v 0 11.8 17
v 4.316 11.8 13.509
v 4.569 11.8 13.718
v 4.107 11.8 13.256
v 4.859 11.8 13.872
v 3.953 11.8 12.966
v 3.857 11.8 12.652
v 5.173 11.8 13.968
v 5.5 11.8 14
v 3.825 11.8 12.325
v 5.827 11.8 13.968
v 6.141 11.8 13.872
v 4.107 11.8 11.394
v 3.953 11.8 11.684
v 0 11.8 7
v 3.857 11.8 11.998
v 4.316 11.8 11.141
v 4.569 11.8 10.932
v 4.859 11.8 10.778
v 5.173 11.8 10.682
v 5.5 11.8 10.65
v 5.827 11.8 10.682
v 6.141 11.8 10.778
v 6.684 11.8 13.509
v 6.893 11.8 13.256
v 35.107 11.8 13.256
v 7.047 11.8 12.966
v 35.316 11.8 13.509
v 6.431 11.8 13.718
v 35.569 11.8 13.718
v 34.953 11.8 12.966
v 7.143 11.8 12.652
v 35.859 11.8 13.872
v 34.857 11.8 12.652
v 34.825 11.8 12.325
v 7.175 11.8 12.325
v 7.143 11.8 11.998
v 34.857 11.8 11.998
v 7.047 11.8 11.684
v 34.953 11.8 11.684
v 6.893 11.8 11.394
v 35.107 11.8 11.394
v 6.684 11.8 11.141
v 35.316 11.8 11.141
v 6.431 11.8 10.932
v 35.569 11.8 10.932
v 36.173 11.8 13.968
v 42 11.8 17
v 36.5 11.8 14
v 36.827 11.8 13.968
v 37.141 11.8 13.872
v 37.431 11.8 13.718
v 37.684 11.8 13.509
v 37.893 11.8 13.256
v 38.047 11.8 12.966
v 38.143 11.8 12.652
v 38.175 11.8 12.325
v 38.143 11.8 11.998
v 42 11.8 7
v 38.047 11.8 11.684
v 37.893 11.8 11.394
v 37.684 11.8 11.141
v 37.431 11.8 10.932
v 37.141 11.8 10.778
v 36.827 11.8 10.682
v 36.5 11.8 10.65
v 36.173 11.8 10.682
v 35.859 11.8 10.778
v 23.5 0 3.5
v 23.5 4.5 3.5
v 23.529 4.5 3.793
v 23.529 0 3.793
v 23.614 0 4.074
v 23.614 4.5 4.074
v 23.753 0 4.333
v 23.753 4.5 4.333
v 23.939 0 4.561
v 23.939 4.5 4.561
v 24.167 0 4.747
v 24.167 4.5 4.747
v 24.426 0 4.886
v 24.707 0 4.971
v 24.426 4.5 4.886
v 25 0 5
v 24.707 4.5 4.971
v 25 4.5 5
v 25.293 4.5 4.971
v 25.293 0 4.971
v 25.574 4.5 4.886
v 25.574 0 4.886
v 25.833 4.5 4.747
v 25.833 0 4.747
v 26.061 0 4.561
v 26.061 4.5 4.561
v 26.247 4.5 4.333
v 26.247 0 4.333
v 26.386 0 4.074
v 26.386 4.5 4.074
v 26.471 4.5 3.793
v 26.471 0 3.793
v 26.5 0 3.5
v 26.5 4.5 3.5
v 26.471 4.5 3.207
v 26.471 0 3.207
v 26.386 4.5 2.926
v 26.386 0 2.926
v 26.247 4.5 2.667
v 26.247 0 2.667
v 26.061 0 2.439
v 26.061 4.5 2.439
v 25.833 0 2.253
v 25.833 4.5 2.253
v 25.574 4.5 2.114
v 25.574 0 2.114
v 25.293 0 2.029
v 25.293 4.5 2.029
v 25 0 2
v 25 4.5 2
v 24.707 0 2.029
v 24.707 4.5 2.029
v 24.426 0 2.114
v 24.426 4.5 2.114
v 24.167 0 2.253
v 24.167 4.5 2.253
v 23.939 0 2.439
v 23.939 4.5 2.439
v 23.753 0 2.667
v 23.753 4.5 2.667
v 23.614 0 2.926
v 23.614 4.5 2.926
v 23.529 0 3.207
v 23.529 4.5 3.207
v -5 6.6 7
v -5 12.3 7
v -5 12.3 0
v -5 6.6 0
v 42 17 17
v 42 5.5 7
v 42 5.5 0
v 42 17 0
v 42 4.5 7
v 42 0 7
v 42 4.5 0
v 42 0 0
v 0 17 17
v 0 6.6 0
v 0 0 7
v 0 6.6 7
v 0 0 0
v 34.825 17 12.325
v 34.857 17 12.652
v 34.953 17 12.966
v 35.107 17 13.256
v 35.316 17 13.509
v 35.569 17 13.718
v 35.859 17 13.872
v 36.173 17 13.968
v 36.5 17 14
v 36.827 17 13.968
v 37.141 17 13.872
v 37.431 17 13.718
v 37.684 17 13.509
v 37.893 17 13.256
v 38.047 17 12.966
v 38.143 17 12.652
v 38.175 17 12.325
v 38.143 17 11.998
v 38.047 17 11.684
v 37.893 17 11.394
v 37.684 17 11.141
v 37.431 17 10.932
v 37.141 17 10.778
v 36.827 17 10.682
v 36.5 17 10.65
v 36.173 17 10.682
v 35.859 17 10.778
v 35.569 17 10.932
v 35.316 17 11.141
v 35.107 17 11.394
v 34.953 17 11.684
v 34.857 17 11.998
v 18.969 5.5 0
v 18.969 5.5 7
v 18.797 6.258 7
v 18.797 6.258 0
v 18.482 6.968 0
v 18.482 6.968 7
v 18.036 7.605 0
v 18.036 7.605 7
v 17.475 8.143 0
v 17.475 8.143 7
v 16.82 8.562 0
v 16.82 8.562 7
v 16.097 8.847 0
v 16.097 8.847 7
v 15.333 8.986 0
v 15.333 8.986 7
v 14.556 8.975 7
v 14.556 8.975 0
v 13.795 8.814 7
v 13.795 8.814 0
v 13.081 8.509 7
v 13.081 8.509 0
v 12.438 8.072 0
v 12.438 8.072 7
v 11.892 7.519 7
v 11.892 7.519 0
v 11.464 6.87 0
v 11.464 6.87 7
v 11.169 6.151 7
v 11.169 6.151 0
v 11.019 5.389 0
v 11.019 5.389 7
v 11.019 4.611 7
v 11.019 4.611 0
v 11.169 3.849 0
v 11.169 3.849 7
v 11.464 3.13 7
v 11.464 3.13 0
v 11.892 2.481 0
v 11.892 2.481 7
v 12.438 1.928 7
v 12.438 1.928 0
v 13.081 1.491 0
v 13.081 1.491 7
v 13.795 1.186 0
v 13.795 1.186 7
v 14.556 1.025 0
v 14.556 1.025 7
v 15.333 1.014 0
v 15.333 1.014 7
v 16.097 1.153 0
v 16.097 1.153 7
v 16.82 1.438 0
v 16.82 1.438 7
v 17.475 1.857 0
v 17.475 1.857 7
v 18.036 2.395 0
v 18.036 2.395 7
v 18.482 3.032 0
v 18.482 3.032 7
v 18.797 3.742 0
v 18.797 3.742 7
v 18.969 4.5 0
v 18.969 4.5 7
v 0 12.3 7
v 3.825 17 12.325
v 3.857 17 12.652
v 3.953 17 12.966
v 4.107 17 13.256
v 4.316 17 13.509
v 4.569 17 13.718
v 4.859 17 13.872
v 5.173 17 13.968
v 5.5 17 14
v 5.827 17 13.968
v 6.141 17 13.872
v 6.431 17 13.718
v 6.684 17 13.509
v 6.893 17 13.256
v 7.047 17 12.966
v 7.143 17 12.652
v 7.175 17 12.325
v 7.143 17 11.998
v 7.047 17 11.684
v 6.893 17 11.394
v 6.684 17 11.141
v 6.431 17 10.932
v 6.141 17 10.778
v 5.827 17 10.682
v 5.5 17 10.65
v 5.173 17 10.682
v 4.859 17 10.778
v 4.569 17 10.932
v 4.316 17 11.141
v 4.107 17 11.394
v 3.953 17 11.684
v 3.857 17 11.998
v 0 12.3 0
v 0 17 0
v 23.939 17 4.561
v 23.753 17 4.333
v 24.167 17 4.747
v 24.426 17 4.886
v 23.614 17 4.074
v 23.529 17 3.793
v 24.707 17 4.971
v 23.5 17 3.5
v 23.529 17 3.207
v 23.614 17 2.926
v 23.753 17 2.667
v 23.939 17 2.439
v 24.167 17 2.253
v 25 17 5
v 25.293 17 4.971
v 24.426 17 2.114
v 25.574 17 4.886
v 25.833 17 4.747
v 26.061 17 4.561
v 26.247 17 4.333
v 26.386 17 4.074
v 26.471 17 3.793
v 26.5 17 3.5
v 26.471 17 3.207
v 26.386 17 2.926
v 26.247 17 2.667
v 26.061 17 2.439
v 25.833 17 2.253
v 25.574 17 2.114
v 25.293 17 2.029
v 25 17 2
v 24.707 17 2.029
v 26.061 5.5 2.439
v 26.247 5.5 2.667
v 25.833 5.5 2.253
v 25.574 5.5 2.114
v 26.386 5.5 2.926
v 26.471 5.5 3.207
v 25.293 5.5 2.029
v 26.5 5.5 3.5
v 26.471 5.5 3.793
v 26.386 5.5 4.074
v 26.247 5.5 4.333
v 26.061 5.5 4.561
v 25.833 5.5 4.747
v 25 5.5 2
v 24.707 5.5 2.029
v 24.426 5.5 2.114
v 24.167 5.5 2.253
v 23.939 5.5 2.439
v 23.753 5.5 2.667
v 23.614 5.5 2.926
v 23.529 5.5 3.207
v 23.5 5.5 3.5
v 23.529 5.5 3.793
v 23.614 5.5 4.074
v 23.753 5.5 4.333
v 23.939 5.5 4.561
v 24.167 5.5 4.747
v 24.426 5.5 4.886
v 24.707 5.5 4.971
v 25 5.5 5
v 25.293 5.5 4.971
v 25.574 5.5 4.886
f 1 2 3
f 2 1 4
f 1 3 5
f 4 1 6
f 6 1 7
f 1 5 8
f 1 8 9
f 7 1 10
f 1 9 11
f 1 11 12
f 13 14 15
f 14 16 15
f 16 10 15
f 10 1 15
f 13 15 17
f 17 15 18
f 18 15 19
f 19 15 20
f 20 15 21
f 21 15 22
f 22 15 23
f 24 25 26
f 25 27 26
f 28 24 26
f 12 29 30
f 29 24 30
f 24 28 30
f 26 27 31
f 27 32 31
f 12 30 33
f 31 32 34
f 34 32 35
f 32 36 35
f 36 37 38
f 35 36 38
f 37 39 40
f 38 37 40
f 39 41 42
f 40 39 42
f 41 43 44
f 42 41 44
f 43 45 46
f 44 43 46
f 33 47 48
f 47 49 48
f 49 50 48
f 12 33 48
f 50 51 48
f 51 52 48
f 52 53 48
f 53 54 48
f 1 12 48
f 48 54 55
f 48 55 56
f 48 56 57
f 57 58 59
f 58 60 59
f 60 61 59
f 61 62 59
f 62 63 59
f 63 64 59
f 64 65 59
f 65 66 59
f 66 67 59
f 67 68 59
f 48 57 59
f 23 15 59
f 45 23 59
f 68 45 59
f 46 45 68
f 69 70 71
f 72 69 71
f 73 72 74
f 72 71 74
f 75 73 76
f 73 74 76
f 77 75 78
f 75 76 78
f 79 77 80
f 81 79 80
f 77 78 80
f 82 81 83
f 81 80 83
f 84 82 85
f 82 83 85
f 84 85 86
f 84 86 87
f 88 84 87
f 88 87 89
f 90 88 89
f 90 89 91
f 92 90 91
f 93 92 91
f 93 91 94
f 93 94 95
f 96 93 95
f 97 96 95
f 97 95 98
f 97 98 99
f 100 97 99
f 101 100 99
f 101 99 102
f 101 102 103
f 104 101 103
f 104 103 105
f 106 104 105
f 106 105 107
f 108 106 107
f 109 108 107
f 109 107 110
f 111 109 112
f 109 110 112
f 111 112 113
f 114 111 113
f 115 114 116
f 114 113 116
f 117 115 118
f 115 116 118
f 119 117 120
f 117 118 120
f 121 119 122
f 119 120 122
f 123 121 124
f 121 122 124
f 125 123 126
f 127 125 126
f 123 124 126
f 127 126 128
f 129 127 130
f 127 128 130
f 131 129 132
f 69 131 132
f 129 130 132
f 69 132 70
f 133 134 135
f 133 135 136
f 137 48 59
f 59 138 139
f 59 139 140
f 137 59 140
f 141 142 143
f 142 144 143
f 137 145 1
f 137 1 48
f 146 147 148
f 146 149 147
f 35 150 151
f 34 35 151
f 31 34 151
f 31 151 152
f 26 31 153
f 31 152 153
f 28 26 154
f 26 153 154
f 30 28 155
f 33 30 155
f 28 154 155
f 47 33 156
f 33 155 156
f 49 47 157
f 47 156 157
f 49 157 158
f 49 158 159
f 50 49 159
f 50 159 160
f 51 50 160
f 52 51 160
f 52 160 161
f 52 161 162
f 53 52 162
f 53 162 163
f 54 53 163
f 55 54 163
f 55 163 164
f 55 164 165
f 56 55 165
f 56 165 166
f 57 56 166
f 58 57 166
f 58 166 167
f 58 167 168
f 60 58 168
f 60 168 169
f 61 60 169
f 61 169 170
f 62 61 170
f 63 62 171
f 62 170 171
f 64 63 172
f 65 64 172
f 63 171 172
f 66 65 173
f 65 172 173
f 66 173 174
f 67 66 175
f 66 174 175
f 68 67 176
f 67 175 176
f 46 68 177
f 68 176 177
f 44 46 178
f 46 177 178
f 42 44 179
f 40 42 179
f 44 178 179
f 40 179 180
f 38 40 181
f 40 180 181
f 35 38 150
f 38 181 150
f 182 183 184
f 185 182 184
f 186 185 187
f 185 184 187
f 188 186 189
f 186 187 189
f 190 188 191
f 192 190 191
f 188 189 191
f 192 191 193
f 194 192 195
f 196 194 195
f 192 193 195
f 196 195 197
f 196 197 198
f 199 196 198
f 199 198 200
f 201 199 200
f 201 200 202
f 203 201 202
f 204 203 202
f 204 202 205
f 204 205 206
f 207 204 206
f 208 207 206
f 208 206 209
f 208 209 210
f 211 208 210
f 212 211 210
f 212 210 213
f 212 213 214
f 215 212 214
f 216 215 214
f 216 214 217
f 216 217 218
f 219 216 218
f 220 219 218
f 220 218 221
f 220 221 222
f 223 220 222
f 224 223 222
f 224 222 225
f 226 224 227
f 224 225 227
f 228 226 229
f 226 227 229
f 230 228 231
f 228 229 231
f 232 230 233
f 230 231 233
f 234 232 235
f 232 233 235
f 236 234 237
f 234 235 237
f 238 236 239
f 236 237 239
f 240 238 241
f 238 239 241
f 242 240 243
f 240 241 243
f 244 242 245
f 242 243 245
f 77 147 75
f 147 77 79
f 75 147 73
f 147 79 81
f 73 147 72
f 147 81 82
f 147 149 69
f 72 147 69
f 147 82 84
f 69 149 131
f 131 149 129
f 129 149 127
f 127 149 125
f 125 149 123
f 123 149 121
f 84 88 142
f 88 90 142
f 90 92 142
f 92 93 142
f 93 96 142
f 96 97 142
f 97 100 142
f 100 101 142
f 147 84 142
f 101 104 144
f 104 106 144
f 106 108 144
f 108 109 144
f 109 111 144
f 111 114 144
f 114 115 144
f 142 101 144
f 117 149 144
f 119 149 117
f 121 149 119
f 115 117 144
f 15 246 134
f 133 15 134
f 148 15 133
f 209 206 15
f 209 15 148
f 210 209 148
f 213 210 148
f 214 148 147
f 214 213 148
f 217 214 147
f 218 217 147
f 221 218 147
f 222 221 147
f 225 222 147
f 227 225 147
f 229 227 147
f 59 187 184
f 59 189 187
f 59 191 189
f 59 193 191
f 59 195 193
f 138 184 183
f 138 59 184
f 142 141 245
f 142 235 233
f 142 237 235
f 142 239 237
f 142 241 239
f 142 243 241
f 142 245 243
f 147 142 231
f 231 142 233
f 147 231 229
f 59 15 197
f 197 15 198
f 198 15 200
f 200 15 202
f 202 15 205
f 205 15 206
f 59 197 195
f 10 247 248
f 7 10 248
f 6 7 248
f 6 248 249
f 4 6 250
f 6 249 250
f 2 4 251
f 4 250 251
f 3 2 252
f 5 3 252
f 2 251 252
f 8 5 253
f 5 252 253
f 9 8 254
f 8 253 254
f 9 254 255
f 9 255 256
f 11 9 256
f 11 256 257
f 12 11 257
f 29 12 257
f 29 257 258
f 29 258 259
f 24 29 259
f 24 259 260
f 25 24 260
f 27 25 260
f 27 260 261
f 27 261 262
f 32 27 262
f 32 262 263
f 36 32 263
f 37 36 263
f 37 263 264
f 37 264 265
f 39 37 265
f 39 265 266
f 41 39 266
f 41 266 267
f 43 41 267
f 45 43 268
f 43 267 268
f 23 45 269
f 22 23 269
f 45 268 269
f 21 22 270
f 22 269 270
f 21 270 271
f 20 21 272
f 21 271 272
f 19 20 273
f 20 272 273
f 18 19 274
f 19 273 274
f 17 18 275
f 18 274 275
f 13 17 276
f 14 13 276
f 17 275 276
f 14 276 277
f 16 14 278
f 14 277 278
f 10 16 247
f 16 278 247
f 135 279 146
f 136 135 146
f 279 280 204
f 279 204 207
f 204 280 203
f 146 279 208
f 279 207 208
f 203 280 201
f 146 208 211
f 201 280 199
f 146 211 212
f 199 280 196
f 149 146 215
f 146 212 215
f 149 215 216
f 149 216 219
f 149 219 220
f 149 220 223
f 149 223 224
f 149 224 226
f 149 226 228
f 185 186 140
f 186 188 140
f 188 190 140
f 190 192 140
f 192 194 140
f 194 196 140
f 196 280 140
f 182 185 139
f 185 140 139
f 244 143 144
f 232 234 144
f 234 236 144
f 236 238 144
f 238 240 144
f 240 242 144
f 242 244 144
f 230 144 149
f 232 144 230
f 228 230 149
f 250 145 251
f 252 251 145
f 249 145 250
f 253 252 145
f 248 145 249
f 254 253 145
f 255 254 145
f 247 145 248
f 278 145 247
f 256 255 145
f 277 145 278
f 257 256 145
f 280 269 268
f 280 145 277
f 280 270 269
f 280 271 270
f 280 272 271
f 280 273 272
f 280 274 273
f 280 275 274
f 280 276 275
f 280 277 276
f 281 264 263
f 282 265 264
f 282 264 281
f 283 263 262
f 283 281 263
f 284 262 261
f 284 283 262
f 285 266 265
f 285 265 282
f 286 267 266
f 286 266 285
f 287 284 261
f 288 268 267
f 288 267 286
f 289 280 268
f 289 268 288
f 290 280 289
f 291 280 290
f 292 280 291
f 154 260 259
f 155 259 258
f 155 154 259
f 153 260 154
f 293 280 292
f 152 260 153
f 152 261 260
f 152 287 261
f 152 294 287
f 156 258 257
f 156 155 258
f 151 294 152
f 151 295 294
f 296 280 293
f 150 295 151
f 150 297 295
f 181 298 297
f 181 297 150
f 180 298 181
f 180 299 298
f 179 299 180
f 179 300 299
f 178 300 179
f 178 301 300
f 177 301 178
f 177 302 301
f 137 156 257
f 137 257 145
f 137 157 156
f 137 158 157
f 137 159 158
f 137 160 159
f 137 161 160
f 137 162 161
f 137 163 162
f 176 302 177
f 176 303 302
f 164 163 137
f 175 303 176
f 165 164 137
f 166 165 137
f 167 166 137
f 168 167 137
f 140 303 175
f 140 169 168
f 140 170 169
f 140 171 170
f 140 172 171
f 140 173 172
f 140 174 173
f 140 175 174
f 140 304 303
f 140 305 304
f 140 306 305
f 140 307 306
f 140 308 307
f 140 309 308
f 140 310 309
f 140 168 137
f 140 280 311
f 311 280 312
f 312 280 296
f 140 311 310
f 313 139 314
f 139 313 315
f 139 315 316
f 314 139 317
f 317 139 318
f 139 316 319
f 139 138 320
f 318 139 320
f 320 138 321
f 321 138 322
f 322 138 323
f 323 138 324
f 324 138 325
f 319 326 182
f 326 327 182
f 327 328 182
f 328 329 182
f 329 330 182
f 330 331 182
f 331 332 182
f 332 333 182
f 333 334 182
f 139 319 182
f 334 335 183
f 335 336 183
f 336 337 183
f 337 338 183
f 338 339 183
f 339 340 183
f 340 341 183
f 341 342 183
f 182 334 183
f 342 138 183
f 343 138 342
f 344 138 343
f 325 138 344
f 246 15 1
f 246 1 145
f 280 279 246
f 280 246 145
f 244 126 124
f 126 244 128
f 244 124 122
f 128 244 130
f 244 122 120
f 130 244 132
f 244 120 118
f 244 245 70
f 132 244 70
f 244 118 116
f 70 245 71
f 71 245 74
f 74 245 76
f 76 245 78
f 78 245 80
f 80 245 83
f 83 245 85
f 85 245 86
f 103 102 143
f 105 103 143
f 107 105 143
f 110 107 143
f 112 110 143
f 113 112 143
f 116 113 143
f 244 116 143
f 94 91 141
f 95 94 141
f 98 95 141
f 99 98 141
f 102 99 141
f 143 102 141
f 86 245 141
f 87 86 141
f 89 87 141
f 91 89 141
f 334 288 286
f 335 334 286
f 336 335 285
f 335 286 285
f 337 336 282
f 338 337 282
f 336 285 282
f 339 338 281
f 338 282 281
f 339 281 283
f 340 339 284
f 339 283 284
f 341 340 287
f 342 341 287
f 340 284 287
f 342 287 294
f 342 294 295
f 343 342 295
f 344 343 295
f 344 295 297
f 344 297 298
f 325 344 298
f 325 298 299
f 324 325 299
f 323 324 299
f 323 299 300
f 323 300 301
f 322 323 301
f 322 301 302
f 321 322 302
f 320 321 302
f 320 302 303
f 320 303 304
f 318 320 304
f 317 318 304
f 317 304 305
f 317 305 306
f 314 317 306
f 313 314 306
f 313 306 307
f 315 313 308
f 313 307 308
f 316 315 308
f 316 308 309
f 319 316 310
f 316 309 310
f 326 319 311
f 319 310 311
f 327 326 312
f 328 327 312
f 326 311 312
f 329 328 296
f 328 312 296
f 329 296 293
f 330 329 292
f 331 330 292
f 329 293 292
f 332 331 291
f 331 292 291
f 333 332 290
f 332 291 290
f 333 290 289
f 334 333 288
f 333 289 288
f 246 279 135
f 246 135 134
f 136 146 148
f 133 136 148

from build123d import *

# Parameters (mm, degrees)
F0_W      = 42
F0_H      = 17
F1_DEPTH  = 7
F4_DEPTH  = 25
F5_W      = 42
F5_H      = 5.2
F6_DEPTH  = 10
F7_R      = 1.675
F8_DEPTH  = 25
F9_DEPTH  = 25
F10_W     = 5.7
F10_H     = 7
F11_DEPTH = 5


with BuildPart() as f1:
    # F0 (on Top) → F1 (new body)
    with BuildSketch(Plane.XY):
        with Locations((21, 8.5)):
            Rectangle(F0_W, F0_H)
    extrude(amount=F1_DEPTH)

    # F3 (on face) → F4 (cut)
    with BuildSketch(Plane(origin=(0, 17, 0), x_dir=(-1, 0, 0), z_dir=(0, 1, 0))):
        with BuildLine():
            ThreePointArc((-26.5, 3.5), (-25, 2), (-23.5, 3.5))
            ThreePointArc((-23.5, 3.5), (-25, 5), (-26.5, 3.5))
        make_face()
    extrude(amount=-F4_DEPTH, mode=Mode.SUBTRACT)

    # F5 (on face) → F6 (join)
    with BuildSketch(Plane.XY.offset(7)):
        with Locations((21, 14.4)):
            Rectangle(F5_W, F5_H)
    extrude(amount=F6_DEPTH)

    # F7 (on face) → F8 (cut)
    with BuildSketch(Plane(origin=(0, 17, 0), x_dir=(-1, 0, 0), z_dir=(0, 1, 0))):
        with Locations((-36.5, 12.325)):
            Circle(F7_R)
        with Locations((-5.5, 12.325)):
            Circle(F7_R)
    extrude(amount=-F8_DEPTH, mode=Mode.SUBTRACT)

    # F2 (on face) → F9 (cut)
    with BuildSketch(Plane.XY.offset(7)):
        with BuildLine():
            ThreePointArc((18.9686269666, 4.5), (18.9921490369, 4.7495083498), (19, 5))
            ThreePointArc((19, 5), (18.9921490369, 5.2504916502), (18.9686269666, 5.5))
            ThreePointArc((18.9686269666, 5.5), (11, 5), (18.9686269666, 4.5))
        make_face()
        with BuildLine():
            Line((42, 5), (19, 5))
            ThreePointArc((19, 5), (18.9921490369, 4.7495083498), (18.9686269666, 4.5))
            Line((18.9686269666, 4.5), (42, 4.5))
            Line((42, 4.5), (42, 5))
        make_face()
        with BuildLine():
            ThreePointArc((18.9686269666, 5.5), (18.9921490369, 5.2504916502), (19, 5))
            Line((19, 5), (42, 5))
            Line((42, 5), (42, 5.5))
            Line((42, 5.5), (18.9686269666, 5.5))
        make_face()
    extrude(amount=-F9_DEPTH, mode=Mode.SUBTRACT)

    # F10 (on face) → F11 (join)
    with BuildSketch(Plane(origin=(0, 0, 0), x_dir=(0, -1, 0), z_dir=(-1, 0, 0))):
        with Locations((-9.45, 3.5)):
            Rectangle(F10_W, F10_H)
    extrude(amount=F11_DEPTH)


solid = f1.part
